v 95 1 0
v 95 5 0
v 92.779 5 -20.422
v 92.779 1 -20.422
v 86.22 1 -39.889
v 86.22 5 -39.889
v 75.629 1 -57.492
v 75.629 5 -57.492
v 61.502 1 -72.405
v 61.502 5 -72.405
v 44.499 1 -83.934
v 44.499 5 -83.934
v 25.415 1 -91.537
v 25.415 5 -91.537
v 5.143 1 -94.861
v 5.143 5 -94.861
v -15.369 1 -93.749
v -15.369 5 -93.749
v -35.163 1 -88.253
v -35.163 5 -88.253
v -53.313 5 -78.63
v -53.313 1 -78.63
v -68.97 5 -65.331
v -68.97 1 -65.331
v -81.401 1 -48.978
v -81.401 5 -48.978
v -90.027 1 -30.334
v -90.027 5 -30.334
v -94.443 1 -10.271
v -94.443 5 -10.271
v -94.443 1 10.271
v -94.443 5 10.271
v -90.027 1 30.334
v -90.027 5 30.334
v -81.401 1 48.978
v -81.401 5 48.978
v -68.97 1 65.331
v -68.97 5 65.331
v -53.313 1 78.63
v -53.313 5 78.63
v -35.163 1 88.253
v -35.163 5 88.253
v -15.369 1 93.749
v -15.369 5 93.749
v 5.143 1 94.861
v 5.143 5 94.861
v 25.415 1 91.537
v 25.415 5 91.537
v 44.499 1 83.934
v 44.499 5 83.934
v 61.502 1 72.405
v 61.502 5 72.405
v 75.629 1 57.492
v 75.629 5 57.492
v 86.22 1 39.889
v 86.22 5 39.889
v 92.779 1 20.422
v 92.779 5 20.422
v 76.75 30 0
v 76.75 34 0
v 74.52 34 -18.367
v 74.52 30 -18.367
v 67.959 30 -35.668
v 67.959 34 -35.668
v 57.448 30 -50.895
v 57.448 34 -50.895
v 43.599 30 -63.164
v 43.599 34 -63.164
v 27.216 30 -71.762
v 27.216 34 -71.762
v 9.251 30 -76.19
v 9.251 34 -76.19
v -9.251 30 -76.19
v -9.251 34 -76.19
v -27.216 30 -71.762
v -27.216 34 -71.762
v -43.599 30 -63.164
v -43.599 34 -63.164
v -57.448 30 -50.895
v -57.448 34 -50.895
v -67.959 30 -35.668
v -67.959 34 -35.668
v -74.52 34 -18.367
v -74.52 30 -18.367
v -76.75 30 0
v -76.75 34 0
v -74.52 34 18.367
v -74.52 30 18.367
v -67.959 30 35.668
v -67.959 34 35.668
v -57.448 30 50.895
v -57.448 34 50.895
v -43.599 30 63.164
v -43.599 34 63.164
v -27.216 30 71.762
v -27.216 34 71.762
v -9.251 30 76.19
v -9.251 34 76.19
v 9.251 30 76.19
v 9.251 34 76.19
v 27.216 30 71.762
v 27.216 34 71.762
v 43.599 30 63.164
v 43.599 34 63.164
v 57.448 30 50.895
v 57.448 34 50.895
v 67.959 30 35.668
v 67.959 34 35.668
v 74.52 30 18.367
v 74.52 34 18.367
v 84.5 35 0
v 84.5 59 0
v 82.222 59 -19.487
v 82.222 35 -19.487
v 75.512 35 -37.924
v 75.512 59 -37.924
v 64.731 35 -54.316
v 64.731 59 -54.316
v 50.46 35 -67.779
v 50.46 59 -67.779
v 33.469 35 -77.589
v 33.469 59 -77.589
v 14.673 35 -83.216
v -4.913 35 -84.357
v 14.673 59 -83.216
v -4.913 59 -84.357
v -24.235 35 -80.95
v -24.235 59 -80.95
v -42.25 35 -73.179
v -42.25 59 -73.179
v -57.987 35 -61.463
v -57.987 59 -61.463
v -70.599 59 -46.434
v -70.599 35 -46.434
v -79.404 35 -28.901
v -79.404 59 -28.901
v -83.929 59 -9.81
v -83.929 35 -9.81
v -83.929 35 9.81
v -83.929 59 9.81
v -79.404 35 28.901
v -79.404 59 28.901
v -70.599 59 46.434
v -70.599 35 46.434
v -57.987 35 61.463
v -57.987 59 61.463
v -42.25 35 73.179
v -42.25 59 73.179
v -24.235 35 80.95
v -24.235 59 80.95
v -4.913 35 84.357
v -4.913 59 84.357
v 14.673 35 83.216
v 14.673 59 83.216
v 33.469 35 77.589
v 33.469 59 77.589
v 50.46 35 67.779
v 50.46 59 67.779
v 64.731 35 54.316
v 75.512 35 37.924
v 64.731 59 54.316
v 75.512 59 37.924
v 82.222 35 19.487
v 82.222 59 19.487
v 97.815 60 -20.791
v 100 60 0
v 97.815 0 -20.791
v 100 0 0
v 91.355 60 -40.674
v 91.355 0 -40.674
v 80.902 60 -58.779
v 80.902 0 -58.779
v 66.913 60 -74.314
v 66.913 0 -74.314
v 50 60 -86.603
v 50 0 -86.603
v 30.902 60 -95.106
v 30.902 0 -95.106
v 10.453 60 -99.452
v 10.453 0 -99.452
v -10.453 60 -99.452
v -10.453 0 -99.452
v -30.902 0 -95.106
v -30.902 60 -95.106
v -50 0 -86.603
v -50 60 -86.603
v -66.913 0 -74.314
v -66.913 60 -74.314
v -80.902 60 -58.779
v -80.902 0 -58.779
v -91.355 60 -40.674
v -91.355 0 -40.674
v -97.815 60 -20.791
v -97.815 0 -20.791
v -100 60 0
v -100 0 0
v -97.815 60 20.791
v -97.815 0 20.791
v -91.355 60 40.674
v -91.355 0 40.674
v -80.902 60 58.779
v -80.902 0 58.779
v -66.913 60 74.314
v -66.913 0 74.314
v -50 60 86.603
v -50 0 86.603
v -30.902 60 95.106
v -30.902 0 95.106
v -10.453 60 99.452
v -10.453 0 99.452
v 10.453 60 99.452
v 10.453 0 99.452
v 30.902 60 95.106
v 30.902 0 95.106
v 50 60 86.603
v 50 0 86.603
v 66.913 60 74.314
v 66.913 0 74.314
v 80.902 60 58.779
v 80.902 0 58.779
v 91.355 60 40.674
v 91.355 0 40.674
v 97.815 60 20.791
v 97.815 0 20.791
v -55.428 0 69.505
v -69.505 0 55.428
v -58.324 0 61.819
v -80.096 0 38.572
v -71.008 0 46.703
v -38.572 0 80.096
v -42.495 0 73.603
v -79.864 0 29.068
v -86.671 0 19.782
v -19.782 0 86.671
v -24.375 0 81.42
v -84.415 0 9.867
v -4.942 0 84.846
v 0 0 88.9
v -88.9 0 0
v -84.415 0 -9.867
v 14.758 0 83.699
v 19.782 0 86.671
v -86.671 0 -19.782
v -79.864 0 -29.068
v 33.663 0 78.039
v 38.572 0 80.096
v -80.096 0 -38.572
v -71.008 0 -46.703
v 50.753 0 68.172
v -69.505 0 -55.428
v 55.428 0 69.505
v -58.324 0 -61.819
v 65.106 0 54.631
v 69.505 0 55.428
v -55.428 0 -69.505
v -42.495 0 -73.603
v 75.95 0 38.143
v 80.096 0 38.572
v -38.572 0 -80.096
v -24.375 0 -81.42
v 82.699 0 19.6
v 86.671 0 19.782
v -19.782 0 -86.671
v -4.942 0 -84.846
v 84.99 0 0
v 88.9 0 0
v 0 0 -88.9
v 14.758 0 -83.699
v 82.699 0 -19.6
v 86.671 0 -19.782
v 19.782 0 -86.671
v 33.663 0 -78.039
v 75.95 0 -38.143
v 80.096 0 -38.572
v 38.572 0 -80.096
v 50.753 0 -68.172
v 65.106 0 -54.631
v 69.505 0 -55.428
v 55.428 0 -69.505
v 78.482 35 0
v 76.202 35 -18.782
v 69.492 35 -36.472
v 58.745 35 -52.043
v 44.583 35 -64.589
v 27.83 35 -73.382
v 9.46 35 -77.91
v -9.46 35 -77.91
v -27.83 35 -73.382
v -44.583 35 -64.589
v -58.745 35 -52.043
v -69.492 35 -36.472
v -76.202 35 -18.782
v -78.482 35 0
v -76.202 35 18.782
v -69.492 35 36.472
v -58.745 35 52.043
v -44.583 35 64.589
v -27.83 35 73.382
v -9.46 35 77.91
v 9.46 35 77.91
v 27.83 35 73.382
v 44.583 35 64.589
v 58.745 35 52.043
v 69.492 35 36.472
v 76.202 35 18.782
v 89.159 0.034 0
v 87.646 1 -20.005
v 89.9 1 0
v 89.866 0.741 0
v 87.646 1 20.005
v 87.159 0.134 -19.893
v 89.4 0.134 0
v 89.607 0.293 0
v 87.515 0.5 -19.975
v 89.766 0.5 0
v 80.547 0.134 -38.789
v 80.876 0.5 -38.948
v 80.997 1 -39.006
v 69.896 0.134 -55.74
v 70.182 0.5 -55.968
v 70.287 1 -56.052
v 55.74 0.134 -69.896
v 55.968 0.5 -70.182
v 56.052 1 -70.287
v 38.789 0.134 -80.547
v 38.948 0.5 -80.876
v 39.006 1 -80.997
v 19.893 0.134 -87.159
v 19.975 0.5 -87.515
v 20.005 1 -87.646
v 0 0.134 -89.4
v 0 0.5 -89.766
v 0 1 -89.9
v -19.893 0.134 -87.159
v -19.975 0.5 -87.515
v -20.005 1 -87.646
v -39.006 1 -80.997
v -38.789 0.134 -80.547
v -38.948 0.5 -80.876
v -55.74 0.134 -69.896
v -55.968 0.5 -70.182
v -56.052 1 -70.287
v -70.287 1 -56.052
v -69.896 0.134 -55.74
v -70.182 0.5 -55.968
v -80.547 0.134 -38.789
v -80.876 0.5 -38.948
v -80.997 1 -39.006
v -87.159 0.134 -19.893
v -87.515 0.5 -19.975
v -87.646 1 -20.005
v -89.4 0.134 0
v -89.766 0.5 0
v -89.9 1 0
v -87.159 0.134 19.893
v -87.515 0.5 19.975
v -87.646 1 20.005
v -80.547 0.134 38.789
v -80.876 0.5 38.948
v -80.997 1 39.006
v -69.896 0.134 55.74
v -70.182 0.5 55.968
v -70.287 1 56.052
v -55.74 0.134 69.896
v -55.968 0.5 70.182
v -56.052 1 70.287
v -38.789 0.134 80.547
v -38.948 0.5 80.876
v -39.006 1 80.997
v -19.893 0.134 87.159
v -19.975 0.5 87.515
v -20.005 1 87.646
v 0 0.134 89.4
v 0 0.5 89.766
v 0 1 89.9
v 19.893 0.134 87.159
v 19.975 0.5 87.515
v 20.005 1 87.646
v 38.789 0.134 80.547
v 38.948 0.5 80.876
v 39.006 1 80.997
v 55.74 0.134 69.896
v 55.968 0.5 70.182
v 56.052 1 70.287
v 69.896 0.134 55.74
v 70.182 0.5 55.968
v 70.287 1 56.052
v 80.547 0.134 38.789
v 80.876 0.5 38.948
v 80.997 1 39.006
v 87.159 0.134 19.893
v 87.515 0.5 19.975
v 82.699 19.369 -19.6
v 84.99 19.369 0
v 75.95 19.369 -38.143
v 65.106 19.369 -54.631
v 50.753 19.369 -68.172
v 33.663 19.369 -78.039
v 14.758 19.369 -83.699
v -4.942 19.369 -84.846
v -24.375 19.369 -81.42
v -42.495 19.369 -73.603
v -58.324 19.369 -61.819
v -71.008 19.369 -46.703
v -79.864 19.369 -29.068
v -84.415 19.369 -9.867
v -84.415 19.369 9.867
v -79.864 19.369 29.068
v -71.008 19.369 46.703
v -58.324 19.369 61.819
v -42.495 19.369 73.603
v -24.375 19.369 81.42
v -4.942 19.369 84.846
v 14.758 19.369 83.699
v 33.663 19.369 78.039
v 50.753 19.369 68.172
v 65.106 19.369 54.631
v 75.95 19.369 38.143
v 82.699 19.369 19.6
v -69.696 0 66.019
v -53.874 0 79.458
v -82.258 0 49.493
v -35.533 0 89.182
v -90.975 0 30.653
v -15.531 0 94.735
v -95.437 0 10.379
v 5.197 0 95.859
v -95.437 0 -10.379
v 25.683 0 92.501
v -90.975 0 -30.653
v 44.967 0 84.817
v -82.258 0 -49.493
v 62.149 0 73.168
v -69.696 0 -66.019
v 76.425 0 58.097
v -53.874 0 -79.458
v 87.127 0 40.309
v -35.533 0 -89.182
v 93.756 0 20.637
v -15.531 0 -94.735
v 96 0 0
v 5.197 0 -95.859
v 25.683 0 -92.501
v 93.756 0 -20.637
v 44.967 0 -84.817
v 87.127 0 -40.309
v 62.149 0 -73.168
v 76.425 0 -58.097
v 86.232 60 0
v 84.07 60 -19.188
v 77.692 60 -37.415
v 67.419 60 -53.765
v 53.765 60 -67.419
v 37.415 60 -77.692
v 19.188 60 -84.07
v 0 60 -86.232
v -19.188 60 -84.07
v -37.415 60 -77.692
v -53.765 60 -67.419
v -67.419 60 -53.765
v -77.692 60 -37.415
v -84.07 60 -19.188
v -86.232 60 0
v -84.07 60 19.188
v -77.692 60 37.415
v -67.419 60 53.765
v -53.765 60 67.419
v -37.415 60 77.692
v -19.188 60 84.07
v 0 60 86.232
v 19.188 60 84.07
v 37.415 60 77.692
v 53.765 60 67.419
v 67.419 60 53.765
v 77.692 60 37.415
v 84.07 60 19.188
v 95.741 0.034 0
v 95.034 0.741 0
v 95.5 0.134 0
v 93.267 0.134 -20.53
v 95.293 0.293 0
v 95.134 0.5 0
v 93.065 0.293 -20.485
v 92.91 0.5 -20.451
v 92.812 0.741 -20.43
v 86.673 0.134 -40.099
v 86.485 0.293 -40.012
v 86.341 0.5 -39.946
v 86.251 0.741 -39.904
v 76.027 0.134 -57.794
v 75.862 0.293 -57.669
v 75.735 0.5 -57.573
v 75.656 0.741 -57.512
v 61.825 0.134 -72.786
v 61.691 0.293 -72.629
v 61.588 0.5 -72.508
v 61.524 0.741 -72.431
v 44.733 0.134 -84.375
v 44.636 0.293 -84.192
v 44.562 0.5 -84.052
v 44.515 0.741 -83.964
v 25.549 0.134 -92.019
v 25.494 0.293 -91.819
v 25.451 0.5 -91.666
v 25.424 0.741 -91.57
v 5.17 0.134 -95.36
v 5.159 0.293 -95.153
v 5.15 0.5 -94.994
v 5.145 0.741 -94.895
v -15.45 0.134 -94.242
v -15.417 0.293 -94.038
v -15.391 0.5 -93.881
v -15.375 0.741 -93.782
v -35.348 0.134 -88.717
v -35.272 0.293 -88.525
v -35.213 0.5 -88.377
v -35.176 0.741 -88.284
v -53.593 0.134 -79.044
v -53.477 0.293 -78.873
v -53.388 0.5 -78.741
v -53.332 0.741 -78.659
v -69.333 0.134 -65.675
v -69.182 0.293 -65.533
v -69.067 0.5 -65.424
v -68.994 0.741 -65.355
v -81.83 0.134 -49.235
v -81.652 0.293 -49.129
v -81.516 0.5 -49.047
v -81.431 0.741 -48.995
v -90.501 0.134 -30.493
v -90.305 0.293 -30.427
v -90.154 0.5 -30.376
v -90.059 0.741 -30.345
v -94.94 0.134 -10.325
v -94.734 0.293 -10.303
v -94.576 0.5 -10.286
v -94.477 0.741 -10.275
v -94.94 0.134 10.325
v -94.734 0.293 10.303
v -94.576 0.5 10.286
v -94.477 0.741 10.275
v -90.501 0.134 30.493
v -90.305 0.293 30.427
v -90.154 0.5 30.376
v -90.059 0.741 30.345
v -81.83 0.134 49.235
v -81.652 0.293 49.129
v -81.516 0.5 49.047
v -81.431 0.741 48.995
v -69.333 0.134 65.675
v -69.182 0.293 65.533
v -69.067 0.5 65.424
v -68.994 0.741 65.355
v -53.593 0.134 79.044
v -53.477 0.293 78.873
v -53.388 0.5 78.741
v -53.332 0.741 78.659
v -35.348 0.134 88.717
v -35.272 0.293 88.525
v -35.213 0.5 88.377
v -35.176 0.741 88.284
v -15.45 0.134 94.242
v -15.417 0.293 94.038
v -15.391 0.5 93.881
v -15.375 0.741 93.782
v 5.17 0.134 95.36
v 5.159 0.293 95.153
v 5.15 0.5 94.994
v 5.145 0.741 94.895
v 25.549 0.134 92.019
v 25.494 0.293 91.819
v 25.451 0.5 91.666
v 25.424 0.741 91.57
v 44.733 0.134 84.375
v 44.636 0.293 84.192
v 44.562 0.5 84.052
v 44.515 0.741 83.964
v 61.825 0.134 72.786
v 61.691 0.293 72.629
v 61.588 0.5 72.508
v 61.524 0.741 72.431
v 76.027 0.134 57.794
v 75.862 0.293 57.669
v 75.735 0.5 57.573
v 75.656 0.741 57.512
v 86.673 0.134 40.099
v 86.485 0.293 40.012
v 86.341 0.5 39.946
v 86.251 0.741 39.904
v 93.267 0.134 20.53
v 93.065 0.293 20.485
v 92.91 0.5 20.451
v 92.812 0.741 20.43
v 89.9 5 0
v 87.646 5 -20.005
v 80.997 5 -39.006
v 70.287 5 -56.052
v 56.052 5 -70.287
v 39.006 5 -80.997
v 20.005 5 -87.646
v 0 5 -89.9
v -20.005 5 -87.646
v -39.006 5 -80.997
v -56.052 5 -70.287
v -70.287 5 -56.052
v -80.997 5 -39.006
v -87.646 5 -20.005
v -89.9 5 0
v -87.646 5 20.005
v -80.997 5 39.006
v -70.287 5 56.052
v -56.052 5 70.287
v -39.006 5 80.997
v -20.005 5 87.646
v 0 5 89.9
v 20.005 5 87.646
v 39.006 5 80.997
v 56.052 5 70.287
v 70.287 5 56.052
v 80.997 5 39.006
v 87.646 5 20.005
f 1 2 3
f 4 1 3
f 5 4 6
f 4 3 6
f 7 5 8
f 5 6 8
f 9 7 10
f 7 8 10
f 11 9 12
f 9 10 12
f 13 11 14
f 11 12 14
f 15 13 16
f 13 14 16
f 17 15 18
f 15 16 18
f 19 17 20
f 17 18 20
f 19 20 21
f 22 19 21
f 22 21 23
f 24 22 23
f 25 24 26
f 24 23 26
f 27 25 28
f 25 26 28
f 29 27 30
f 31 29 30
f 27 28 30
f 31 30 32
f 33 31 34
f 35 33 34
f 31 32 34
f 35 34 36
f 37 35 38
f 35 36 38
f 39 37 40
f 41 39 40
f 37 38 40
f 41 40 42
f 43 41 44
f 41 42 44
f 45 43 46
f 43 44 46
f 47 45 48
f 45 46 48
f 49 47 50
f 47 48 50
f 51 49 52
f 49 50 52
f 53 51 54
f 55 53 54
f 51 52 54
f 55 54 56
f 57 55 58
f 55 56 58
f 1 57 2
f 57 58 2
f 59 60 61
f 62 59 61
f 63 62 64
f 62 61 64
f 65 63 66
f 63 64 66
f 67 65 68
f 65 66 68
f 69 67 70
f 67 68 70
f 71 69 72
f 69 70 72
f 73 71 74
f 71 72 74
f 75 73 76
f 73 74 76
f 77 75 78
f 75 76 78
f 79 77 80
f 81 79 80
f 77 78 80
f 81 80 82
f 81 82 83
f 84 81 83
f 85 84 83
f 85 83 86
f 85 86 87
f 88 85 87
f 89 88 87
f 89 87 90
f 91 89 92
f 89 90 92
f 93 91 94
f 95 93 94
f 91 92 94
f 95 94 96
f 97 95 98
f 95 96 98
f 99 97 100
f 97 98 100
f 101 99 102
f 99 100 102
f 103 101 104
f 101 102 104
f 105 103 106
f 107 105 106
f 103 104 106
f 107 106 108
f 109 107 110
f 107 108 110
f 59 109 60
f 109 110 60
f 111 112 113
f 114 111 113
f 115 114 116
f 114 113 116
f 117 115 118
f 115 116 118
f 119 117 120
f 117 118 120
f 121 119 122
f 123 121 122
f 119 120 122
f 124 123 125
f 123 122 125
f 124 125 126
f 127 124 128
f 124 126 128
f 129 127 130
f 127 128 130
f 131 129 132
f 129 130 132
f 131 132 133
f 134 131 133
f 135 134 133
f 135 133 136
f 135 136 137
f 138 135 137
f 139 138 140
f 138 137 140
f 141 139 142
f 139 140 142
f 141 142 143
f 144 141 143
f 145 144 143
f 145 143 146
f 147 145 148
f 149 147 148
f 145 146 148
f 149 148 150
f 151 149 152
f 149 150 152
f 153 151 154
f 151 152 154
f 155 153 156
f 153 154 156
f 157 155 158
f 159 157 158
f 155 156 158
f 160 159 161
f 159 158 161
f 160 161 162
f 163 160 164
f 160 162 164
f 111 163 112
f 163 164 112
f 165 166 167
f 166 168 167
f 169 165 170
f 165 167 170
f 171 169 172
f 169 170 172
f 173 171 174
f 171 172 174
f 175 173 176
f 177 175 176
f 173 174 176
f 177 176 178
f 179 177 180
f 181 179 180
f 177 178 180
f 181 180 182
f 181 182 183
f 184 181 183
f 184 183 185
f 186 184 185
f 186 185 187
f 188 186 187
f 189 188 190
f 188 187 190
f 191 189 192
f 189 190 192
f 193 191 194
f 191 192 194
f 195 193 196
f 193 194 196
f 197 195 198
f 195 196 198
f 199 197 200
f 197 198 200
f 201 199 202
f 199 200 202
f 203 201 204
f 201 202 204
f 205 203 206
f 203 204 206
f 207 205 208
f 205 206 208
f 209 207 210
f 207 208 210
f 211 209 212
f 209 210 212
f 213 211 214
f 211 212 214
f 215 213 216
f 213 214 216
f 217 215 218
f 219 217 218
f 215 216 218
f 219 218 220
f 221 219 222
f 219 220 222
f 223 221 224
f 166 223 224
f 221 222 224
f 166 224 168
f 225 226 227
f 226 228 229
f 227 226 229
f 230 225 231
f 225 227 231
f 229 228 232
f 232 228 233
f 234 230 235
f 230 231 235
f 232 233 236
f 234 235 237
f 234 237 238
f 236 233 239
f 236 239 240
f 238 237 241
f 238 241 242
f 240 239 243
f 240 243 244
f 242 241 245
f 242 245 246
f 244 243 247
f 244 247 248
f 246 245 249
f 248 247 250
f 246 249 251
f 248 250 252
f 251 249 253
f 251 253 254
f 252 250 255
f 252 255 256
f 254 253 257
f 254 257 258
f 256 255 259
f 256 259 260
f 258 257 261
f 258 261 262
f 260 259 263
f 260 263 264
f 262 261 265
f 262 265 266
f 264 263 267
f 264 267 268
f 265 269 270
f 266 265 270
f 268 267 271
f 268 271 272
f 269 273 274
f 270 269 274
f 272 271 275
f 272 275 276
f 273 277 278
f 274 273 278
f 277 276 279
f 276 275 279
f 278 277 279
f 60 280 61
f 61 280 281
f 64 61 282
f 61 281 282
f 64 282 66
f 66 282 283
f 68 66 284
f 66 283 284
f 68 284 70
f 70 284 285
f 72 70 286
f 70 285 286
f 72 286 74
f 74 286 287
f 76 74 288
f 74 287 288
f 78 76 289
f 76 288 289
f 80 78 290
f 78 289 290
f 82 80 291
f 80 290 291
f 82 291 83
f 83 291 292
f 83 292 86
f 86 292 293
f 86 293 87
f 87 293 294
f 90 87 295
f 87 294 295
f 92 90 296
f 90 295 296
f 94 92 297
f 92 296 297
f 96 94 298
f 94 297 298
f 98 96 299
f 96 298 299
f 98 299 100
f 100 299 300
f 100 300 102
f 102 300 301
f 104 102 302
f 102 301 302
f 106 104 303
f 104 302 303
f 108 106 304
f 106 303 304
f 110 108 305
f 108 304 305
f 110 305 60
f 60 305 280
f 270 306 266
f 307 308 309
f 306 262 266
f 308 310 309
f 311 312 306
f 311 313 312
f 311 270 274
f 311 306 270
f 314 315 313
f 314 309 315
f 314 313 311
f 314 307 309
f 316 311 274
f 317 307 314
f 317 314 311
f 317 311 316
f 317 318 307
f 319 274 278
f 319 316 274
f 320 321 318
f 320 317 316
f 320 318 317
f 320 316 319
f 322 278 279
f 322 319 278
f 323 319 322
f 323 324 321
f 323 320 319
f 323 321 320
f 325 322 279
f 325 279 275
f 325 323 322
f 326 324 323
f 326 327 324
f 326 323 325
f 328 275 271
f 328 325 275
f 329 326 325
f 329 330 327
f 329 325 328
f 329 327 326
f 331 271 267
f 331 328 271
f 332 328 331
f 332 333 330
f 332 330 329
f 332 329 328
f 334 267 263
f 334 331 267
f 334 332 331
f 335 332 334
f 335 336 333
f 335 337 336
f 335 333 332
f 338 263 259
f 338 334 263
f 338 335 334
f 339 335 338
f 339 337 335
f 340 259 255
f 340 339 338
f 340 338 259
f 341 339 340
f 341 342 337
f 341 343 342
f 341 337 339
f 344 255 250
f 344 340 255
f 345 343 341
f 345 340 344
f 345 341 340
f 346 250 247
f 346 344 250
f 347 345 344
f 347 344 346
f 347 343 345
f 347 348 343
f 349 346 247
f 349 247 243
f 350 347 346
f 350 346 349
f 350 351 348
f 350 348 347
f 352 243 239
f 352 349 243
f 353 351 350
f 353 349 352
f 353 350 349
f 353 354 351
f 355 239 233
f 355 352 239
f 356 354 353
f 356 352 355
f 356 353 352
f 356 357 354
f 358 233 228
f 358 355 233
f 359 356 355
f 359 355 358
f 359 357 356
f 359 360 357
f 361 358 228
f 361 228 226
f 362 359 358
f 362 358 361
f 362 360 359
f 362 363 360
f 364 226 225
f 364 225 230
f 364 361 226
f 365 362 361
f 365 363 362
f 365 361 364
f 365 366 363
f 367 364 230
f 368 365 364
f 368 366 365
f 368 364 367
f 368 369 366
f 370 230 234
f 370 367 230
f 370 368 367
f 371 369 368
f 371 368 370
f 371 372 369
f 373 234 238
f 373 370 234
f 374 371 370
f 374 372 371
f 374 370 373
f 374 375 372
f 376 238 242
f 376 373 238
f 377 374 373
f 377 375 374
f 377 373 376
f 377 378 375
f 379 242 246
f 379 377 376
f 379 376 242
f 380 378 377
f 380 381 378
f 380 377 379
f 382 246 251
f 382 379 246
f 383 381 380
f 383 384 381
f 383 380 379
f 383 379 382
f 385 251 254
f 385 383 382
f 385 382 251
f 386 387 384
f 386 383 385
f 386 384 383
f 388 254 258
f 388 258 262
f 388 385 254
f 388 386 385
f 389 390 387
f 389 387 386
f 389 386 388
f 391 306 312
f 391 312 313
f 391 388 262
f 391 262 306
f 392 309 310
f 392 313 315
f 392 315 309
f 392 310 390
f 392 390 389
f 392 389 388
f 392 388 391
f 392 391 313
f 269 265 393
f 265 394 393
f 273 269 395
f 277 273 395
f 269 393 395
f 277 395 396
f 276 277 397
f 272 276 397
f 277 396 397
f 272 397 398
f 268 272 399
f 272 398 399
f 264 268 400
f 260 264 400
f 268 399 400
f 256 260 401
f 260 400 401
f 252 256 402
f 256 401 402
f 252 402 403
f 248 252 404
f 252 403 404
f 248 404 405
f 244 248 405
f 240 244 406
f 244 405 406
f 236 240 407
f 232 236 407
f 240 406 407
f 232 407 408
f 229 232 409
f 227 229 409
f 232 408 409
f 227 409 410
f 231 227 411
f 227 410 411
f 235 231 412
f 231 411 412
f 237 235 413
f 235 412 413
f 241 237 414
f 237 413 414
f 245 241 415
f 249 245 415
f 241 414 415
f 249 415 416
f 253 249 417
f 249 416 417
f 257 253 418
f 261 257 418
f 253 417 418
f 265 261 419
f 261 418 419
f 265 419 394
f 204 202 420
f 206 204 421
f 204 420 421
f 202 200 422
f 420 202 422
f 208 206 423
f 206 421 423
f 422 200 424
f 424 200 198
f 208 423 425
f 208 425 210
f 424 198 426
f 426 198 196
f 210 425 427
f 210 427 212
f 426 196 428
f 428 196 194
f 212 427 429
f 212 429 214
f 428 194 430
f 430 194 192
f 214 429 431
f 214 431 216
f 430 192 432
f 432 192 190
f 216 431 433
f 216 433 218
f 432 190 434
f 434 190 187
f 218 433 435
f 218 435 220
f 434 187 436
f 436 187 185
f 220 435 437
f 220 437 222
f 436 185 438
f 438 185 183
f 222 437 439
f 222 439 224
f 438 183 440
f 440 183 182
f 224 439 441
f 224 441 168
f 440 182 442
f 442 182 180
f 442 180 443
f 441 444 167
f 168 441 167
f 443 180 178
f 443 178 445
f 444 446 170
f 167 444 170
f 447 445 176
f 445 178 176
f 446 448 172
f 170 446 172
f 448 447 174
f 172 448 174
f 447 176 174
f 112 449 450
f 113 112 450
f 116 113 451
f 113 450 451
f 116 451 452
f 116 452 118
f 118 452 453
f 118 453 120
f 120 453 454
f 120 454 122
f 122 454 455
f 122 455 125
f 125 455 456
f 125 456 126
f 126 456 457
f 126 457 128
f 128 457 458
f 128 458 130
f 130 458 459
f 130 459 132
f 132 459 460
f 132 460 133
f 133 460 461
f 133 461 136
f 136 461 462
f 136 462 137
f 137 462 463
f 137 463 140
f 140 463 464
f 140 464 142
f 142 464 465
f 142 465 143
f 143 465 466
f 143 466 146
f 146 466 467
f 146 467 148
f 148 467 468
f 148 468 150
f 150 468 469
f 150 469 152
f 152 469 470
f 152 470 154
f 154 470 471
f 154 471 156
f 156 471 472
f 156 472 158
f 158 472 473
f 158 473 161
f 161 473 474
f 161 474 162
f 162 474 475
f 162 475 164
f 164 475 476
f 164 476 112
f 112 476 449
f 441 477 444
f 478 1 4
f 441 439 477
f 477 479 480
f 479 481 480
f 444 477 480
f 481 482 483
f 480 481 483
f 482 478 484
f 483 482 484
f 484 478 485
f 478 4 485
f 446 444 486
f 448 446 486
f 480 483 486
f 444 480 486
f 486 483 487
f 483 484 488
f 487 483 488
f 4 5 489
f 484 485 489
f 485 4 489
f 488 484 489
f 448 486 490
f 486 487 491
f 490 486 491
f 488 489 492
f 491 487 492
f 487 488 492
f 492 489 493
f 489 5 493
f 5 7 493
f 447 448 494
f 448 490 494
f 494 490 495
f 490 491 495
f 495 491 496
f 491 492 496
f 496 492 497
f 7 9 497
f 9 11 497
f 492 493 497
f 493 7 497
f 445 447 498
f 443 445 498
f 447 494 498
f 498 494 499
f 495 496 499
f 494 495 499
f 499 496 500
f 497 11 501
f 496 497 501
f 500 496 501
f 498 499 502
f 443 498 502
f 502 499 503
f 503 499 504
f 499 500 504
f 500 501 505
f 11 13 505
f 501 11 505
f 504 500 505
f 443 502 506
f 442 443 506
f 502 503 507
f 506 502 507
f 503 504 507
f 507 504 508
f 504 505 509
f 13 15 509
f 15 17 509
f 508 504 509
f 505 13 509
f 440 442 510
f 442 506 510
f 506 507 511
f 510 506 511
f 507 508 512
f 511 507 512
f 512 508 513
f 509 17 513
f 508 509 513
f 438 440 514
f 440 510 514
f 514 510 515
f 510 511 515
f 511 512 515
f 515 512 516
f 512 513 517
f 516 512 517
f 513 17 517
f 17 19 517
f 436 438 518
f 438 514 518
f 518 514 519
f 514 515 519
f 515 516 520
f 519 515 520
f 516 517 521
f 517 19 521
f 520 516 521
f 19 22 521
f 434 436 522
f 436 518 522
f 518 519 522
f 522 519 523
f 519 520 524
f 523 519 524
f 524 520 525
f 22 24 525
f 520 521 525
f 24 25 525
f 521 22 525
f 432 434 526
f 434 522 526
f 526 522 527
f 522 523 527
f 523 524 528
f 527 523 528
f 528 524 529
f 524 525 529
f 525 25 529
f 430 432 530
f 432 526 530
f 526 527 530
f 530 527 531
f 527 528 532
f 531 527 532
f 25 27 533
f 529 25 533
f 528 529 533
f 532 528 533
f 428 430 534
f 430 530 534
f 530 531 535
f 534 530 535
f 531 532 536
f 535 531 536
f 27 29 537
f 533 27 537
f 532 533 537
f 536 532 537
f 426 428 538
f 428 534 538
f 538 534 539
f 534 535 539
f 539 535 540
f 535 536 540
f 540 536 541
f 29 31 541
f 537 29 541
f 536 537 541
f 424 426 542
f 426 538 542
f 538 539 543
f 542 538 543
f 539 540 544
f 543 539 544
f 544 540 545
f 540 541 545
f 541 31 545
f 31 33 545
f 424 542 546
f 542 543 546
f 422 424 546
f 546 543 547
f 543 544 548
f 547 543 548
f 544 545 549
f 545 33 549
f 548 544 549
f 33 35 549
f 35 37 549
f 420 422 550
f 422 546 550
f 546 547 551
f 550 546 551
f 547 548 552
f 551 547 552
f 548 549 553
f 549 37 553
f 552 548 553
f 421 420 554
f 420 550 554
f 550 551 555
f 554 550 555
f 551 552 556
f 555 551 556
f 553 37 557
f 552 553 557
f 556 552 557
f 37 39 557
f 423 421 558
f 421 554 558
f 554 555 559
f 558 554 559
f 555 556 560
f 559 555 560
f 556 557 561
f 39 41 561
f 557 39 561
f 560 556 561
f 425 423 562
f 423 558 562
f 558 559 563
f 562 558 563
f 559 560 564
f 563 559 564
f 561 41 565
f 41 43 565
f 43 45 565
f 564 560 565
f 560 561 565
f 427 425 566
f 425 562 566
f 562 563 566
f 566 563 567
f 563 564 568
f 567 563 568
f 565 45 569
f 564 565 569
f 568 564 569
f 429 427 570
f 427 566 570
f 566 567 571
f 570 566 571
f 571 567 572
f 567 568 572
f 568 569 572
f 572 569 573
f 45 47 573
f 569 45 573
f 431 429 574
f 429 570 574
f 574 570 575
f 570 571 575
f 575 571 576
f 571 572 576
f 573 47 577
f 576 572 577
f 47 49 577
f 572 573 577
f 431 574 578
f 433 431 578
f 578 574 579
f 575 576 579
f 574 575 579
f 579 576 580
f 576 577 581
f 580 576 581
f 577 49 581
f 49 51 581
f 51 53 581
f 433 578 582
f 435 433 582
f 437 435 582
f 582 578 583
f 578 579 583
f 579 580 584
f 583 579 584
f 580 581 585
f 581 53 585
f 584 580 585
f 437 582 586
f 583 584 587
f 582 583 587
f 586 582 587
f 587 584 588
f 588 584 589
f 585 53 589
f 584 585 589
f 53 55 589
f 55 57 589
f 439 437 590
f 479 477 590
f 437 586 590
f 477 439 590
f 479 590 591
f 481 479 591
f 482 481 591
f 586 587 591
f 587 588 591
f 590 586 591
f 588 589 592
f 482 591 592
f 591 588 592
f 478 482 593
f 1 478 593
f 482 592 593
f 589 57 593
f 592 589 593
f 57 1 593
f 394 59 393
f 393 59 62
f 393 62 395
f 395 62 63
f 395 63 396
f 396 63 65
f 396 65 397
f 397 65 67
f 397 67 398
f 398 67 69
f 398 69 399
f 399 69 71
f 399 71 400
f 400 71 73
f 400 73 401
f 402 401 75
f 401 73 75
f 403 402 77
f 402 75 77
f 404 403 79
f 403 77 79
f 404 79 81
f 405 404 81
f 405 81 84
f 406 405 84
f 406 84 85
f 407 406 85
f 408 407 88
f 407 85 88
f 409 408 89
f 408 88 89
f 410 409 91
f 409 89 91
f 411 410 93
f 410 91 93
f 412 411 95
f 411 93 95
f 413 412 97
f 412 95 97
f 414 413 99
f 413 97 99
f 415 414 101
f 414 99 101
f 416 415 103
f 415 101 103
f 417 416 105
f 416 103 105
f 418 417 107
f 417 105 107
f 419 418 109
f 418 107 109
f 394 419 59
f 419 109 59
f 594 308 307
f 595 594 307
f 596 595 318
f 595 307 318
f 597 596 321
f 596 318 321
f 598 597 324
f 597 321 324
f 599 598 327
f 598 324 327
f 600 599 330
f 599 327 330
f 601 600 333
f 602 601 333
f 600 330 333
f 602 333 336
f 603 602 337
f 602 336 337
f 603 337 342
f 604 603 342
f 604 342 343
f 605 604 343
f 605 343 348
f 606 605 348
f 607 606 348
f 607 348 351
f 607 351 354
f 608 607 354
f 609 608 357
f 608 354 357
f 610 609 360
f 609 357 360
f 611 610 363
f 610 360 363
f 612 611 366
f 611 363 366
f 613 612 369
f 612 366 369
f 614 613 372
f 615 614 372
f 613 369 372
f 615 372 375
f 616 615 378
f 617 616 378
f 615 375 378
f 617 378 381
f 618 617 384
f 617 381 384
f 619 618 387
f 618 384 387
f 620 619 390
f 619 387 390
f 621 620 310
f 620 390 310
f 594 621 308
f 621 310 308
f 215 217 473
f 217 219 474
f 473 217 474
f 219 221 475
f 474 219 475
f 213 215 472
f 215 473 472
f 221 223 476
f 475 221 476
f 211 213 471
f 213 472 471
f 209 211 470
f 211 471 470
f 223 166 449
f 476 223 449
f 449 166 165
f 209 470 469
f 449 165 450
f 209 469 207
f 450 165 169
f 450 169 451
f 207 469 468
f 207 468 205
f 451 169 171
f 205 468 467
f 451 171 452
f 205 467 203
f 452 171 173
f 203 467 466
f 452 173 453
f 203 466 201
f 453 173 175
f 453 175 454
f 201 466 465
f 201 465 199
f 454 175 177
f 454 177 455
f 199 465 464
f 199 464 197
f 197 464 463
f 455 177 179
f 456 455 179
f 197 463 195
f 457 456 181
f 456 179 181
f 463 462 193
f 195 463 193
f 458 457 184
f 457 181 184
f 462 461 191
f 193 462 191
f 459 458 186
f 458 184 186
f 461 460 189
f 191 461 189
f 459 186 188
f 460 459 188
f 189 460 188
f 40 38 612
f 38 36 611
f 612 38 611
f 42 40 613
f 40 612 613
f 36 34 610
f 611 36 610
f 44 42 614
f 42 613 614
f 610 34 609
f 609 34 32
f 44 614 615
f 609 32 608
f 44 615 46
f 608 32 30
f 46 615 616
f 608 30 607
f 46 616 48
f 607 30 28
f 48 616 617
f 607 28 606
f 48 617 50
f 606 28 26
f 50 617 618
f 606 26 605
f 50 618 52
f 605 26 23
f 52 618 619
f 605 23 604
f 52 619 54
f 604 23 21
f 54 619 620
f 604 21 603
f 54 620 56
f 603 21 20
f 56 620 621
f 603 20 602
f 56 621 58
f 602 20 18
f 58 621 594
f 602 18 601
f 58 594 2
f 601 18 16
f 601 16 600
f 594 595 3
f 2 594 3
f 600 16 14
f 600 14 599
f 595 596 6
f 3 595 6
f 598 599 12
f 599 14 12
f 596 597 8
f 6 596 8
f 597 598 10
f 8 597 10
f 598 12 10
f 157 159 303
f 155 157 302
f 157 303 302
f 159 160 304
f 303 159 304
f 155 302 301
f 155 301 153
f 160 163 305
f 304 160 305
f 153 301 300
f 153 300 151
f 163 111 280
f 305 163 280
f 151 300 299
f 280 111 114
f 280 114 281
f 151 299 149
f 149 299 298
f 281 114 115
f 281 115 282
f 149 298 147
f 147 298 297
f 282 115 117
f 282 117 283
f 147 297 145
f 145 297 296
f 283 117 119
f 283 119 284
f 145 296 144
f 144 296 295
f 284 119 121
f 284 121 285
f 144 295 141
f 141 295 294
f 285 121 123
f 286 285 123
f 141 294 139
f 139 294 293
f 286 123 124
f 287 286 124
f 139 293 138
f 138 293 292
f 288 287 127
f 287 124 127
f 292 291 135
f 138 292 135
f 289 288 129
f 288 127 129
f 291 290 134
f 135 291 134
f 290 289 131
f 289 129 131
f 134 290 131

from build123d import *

# Parameters (mm, degrees)
CHAMFER2_SIZE         = 1
CHAMFER2_SIZE2        = 1.732050808
CHAMFER2_PART_2_SIZE  = 1
CHAMFER2_PART_2_SIZE2 = 1.732050808
FILLET1_R             = 1


with BuildPart() as part:
    # Sketch1 → Revolve1 (revolve)
    with BuildSketch(Plane.XY):
        Polygon((84.5, 60), (100, 60), (100, 0), (95, 0), (95, 5), (89.9, 5), (89.9, 0), (84.99, 0), (84.99, 19.369395797), (76.75, 30), (76.75, 35), (84.5, 35), align=None)
    revolve(axis=Axis((0, 0, 0), (0, 1, 0)))

    # Chamfer2
    chamfer2_edges = [part.edges().sort_by_distance(p)[0] for p in [
        (-84.5, 60, 0),
    ]]
    chamfer2_side = [part.faces().sort_by_distance(p)[0] for p in [
        (-84.5, 47.5, 0),
    ]]
    chamfer(chamfer2_edges, length=CHAMFER2_SIZE, length2=CHAMFER2_SIZE2, reference=chamfer2_side[0])

    # Chamfer2 part 2
    chamfer2_part_2_edges = [part.edges().sort_by_distance(p)[0] for p in [
        (-76.75, 35, 0),
    ]]
    chamfer2_part_2_side = [part.faces().sort_by_distance(p)[0] for p in [
        (-76.75, 32.5, 0),
    ]]
    chamfer(chamfer2_part_2_edges, length=CHAMFER2_PART_2_SIZE, length2=CHAMFER2_PART_2_SIZE2, reference=chamfer2_part_2_side[0])

    # Fillet1
    fillet1_edges = [part.edges().sort_by_distance(p)[0] for p in [
        (-95, 0, 0),
        (-89.9, 0, 0),
    ]]
    fillet(fillet1_edges, radius=FILLET1_R)


solid = part.part
